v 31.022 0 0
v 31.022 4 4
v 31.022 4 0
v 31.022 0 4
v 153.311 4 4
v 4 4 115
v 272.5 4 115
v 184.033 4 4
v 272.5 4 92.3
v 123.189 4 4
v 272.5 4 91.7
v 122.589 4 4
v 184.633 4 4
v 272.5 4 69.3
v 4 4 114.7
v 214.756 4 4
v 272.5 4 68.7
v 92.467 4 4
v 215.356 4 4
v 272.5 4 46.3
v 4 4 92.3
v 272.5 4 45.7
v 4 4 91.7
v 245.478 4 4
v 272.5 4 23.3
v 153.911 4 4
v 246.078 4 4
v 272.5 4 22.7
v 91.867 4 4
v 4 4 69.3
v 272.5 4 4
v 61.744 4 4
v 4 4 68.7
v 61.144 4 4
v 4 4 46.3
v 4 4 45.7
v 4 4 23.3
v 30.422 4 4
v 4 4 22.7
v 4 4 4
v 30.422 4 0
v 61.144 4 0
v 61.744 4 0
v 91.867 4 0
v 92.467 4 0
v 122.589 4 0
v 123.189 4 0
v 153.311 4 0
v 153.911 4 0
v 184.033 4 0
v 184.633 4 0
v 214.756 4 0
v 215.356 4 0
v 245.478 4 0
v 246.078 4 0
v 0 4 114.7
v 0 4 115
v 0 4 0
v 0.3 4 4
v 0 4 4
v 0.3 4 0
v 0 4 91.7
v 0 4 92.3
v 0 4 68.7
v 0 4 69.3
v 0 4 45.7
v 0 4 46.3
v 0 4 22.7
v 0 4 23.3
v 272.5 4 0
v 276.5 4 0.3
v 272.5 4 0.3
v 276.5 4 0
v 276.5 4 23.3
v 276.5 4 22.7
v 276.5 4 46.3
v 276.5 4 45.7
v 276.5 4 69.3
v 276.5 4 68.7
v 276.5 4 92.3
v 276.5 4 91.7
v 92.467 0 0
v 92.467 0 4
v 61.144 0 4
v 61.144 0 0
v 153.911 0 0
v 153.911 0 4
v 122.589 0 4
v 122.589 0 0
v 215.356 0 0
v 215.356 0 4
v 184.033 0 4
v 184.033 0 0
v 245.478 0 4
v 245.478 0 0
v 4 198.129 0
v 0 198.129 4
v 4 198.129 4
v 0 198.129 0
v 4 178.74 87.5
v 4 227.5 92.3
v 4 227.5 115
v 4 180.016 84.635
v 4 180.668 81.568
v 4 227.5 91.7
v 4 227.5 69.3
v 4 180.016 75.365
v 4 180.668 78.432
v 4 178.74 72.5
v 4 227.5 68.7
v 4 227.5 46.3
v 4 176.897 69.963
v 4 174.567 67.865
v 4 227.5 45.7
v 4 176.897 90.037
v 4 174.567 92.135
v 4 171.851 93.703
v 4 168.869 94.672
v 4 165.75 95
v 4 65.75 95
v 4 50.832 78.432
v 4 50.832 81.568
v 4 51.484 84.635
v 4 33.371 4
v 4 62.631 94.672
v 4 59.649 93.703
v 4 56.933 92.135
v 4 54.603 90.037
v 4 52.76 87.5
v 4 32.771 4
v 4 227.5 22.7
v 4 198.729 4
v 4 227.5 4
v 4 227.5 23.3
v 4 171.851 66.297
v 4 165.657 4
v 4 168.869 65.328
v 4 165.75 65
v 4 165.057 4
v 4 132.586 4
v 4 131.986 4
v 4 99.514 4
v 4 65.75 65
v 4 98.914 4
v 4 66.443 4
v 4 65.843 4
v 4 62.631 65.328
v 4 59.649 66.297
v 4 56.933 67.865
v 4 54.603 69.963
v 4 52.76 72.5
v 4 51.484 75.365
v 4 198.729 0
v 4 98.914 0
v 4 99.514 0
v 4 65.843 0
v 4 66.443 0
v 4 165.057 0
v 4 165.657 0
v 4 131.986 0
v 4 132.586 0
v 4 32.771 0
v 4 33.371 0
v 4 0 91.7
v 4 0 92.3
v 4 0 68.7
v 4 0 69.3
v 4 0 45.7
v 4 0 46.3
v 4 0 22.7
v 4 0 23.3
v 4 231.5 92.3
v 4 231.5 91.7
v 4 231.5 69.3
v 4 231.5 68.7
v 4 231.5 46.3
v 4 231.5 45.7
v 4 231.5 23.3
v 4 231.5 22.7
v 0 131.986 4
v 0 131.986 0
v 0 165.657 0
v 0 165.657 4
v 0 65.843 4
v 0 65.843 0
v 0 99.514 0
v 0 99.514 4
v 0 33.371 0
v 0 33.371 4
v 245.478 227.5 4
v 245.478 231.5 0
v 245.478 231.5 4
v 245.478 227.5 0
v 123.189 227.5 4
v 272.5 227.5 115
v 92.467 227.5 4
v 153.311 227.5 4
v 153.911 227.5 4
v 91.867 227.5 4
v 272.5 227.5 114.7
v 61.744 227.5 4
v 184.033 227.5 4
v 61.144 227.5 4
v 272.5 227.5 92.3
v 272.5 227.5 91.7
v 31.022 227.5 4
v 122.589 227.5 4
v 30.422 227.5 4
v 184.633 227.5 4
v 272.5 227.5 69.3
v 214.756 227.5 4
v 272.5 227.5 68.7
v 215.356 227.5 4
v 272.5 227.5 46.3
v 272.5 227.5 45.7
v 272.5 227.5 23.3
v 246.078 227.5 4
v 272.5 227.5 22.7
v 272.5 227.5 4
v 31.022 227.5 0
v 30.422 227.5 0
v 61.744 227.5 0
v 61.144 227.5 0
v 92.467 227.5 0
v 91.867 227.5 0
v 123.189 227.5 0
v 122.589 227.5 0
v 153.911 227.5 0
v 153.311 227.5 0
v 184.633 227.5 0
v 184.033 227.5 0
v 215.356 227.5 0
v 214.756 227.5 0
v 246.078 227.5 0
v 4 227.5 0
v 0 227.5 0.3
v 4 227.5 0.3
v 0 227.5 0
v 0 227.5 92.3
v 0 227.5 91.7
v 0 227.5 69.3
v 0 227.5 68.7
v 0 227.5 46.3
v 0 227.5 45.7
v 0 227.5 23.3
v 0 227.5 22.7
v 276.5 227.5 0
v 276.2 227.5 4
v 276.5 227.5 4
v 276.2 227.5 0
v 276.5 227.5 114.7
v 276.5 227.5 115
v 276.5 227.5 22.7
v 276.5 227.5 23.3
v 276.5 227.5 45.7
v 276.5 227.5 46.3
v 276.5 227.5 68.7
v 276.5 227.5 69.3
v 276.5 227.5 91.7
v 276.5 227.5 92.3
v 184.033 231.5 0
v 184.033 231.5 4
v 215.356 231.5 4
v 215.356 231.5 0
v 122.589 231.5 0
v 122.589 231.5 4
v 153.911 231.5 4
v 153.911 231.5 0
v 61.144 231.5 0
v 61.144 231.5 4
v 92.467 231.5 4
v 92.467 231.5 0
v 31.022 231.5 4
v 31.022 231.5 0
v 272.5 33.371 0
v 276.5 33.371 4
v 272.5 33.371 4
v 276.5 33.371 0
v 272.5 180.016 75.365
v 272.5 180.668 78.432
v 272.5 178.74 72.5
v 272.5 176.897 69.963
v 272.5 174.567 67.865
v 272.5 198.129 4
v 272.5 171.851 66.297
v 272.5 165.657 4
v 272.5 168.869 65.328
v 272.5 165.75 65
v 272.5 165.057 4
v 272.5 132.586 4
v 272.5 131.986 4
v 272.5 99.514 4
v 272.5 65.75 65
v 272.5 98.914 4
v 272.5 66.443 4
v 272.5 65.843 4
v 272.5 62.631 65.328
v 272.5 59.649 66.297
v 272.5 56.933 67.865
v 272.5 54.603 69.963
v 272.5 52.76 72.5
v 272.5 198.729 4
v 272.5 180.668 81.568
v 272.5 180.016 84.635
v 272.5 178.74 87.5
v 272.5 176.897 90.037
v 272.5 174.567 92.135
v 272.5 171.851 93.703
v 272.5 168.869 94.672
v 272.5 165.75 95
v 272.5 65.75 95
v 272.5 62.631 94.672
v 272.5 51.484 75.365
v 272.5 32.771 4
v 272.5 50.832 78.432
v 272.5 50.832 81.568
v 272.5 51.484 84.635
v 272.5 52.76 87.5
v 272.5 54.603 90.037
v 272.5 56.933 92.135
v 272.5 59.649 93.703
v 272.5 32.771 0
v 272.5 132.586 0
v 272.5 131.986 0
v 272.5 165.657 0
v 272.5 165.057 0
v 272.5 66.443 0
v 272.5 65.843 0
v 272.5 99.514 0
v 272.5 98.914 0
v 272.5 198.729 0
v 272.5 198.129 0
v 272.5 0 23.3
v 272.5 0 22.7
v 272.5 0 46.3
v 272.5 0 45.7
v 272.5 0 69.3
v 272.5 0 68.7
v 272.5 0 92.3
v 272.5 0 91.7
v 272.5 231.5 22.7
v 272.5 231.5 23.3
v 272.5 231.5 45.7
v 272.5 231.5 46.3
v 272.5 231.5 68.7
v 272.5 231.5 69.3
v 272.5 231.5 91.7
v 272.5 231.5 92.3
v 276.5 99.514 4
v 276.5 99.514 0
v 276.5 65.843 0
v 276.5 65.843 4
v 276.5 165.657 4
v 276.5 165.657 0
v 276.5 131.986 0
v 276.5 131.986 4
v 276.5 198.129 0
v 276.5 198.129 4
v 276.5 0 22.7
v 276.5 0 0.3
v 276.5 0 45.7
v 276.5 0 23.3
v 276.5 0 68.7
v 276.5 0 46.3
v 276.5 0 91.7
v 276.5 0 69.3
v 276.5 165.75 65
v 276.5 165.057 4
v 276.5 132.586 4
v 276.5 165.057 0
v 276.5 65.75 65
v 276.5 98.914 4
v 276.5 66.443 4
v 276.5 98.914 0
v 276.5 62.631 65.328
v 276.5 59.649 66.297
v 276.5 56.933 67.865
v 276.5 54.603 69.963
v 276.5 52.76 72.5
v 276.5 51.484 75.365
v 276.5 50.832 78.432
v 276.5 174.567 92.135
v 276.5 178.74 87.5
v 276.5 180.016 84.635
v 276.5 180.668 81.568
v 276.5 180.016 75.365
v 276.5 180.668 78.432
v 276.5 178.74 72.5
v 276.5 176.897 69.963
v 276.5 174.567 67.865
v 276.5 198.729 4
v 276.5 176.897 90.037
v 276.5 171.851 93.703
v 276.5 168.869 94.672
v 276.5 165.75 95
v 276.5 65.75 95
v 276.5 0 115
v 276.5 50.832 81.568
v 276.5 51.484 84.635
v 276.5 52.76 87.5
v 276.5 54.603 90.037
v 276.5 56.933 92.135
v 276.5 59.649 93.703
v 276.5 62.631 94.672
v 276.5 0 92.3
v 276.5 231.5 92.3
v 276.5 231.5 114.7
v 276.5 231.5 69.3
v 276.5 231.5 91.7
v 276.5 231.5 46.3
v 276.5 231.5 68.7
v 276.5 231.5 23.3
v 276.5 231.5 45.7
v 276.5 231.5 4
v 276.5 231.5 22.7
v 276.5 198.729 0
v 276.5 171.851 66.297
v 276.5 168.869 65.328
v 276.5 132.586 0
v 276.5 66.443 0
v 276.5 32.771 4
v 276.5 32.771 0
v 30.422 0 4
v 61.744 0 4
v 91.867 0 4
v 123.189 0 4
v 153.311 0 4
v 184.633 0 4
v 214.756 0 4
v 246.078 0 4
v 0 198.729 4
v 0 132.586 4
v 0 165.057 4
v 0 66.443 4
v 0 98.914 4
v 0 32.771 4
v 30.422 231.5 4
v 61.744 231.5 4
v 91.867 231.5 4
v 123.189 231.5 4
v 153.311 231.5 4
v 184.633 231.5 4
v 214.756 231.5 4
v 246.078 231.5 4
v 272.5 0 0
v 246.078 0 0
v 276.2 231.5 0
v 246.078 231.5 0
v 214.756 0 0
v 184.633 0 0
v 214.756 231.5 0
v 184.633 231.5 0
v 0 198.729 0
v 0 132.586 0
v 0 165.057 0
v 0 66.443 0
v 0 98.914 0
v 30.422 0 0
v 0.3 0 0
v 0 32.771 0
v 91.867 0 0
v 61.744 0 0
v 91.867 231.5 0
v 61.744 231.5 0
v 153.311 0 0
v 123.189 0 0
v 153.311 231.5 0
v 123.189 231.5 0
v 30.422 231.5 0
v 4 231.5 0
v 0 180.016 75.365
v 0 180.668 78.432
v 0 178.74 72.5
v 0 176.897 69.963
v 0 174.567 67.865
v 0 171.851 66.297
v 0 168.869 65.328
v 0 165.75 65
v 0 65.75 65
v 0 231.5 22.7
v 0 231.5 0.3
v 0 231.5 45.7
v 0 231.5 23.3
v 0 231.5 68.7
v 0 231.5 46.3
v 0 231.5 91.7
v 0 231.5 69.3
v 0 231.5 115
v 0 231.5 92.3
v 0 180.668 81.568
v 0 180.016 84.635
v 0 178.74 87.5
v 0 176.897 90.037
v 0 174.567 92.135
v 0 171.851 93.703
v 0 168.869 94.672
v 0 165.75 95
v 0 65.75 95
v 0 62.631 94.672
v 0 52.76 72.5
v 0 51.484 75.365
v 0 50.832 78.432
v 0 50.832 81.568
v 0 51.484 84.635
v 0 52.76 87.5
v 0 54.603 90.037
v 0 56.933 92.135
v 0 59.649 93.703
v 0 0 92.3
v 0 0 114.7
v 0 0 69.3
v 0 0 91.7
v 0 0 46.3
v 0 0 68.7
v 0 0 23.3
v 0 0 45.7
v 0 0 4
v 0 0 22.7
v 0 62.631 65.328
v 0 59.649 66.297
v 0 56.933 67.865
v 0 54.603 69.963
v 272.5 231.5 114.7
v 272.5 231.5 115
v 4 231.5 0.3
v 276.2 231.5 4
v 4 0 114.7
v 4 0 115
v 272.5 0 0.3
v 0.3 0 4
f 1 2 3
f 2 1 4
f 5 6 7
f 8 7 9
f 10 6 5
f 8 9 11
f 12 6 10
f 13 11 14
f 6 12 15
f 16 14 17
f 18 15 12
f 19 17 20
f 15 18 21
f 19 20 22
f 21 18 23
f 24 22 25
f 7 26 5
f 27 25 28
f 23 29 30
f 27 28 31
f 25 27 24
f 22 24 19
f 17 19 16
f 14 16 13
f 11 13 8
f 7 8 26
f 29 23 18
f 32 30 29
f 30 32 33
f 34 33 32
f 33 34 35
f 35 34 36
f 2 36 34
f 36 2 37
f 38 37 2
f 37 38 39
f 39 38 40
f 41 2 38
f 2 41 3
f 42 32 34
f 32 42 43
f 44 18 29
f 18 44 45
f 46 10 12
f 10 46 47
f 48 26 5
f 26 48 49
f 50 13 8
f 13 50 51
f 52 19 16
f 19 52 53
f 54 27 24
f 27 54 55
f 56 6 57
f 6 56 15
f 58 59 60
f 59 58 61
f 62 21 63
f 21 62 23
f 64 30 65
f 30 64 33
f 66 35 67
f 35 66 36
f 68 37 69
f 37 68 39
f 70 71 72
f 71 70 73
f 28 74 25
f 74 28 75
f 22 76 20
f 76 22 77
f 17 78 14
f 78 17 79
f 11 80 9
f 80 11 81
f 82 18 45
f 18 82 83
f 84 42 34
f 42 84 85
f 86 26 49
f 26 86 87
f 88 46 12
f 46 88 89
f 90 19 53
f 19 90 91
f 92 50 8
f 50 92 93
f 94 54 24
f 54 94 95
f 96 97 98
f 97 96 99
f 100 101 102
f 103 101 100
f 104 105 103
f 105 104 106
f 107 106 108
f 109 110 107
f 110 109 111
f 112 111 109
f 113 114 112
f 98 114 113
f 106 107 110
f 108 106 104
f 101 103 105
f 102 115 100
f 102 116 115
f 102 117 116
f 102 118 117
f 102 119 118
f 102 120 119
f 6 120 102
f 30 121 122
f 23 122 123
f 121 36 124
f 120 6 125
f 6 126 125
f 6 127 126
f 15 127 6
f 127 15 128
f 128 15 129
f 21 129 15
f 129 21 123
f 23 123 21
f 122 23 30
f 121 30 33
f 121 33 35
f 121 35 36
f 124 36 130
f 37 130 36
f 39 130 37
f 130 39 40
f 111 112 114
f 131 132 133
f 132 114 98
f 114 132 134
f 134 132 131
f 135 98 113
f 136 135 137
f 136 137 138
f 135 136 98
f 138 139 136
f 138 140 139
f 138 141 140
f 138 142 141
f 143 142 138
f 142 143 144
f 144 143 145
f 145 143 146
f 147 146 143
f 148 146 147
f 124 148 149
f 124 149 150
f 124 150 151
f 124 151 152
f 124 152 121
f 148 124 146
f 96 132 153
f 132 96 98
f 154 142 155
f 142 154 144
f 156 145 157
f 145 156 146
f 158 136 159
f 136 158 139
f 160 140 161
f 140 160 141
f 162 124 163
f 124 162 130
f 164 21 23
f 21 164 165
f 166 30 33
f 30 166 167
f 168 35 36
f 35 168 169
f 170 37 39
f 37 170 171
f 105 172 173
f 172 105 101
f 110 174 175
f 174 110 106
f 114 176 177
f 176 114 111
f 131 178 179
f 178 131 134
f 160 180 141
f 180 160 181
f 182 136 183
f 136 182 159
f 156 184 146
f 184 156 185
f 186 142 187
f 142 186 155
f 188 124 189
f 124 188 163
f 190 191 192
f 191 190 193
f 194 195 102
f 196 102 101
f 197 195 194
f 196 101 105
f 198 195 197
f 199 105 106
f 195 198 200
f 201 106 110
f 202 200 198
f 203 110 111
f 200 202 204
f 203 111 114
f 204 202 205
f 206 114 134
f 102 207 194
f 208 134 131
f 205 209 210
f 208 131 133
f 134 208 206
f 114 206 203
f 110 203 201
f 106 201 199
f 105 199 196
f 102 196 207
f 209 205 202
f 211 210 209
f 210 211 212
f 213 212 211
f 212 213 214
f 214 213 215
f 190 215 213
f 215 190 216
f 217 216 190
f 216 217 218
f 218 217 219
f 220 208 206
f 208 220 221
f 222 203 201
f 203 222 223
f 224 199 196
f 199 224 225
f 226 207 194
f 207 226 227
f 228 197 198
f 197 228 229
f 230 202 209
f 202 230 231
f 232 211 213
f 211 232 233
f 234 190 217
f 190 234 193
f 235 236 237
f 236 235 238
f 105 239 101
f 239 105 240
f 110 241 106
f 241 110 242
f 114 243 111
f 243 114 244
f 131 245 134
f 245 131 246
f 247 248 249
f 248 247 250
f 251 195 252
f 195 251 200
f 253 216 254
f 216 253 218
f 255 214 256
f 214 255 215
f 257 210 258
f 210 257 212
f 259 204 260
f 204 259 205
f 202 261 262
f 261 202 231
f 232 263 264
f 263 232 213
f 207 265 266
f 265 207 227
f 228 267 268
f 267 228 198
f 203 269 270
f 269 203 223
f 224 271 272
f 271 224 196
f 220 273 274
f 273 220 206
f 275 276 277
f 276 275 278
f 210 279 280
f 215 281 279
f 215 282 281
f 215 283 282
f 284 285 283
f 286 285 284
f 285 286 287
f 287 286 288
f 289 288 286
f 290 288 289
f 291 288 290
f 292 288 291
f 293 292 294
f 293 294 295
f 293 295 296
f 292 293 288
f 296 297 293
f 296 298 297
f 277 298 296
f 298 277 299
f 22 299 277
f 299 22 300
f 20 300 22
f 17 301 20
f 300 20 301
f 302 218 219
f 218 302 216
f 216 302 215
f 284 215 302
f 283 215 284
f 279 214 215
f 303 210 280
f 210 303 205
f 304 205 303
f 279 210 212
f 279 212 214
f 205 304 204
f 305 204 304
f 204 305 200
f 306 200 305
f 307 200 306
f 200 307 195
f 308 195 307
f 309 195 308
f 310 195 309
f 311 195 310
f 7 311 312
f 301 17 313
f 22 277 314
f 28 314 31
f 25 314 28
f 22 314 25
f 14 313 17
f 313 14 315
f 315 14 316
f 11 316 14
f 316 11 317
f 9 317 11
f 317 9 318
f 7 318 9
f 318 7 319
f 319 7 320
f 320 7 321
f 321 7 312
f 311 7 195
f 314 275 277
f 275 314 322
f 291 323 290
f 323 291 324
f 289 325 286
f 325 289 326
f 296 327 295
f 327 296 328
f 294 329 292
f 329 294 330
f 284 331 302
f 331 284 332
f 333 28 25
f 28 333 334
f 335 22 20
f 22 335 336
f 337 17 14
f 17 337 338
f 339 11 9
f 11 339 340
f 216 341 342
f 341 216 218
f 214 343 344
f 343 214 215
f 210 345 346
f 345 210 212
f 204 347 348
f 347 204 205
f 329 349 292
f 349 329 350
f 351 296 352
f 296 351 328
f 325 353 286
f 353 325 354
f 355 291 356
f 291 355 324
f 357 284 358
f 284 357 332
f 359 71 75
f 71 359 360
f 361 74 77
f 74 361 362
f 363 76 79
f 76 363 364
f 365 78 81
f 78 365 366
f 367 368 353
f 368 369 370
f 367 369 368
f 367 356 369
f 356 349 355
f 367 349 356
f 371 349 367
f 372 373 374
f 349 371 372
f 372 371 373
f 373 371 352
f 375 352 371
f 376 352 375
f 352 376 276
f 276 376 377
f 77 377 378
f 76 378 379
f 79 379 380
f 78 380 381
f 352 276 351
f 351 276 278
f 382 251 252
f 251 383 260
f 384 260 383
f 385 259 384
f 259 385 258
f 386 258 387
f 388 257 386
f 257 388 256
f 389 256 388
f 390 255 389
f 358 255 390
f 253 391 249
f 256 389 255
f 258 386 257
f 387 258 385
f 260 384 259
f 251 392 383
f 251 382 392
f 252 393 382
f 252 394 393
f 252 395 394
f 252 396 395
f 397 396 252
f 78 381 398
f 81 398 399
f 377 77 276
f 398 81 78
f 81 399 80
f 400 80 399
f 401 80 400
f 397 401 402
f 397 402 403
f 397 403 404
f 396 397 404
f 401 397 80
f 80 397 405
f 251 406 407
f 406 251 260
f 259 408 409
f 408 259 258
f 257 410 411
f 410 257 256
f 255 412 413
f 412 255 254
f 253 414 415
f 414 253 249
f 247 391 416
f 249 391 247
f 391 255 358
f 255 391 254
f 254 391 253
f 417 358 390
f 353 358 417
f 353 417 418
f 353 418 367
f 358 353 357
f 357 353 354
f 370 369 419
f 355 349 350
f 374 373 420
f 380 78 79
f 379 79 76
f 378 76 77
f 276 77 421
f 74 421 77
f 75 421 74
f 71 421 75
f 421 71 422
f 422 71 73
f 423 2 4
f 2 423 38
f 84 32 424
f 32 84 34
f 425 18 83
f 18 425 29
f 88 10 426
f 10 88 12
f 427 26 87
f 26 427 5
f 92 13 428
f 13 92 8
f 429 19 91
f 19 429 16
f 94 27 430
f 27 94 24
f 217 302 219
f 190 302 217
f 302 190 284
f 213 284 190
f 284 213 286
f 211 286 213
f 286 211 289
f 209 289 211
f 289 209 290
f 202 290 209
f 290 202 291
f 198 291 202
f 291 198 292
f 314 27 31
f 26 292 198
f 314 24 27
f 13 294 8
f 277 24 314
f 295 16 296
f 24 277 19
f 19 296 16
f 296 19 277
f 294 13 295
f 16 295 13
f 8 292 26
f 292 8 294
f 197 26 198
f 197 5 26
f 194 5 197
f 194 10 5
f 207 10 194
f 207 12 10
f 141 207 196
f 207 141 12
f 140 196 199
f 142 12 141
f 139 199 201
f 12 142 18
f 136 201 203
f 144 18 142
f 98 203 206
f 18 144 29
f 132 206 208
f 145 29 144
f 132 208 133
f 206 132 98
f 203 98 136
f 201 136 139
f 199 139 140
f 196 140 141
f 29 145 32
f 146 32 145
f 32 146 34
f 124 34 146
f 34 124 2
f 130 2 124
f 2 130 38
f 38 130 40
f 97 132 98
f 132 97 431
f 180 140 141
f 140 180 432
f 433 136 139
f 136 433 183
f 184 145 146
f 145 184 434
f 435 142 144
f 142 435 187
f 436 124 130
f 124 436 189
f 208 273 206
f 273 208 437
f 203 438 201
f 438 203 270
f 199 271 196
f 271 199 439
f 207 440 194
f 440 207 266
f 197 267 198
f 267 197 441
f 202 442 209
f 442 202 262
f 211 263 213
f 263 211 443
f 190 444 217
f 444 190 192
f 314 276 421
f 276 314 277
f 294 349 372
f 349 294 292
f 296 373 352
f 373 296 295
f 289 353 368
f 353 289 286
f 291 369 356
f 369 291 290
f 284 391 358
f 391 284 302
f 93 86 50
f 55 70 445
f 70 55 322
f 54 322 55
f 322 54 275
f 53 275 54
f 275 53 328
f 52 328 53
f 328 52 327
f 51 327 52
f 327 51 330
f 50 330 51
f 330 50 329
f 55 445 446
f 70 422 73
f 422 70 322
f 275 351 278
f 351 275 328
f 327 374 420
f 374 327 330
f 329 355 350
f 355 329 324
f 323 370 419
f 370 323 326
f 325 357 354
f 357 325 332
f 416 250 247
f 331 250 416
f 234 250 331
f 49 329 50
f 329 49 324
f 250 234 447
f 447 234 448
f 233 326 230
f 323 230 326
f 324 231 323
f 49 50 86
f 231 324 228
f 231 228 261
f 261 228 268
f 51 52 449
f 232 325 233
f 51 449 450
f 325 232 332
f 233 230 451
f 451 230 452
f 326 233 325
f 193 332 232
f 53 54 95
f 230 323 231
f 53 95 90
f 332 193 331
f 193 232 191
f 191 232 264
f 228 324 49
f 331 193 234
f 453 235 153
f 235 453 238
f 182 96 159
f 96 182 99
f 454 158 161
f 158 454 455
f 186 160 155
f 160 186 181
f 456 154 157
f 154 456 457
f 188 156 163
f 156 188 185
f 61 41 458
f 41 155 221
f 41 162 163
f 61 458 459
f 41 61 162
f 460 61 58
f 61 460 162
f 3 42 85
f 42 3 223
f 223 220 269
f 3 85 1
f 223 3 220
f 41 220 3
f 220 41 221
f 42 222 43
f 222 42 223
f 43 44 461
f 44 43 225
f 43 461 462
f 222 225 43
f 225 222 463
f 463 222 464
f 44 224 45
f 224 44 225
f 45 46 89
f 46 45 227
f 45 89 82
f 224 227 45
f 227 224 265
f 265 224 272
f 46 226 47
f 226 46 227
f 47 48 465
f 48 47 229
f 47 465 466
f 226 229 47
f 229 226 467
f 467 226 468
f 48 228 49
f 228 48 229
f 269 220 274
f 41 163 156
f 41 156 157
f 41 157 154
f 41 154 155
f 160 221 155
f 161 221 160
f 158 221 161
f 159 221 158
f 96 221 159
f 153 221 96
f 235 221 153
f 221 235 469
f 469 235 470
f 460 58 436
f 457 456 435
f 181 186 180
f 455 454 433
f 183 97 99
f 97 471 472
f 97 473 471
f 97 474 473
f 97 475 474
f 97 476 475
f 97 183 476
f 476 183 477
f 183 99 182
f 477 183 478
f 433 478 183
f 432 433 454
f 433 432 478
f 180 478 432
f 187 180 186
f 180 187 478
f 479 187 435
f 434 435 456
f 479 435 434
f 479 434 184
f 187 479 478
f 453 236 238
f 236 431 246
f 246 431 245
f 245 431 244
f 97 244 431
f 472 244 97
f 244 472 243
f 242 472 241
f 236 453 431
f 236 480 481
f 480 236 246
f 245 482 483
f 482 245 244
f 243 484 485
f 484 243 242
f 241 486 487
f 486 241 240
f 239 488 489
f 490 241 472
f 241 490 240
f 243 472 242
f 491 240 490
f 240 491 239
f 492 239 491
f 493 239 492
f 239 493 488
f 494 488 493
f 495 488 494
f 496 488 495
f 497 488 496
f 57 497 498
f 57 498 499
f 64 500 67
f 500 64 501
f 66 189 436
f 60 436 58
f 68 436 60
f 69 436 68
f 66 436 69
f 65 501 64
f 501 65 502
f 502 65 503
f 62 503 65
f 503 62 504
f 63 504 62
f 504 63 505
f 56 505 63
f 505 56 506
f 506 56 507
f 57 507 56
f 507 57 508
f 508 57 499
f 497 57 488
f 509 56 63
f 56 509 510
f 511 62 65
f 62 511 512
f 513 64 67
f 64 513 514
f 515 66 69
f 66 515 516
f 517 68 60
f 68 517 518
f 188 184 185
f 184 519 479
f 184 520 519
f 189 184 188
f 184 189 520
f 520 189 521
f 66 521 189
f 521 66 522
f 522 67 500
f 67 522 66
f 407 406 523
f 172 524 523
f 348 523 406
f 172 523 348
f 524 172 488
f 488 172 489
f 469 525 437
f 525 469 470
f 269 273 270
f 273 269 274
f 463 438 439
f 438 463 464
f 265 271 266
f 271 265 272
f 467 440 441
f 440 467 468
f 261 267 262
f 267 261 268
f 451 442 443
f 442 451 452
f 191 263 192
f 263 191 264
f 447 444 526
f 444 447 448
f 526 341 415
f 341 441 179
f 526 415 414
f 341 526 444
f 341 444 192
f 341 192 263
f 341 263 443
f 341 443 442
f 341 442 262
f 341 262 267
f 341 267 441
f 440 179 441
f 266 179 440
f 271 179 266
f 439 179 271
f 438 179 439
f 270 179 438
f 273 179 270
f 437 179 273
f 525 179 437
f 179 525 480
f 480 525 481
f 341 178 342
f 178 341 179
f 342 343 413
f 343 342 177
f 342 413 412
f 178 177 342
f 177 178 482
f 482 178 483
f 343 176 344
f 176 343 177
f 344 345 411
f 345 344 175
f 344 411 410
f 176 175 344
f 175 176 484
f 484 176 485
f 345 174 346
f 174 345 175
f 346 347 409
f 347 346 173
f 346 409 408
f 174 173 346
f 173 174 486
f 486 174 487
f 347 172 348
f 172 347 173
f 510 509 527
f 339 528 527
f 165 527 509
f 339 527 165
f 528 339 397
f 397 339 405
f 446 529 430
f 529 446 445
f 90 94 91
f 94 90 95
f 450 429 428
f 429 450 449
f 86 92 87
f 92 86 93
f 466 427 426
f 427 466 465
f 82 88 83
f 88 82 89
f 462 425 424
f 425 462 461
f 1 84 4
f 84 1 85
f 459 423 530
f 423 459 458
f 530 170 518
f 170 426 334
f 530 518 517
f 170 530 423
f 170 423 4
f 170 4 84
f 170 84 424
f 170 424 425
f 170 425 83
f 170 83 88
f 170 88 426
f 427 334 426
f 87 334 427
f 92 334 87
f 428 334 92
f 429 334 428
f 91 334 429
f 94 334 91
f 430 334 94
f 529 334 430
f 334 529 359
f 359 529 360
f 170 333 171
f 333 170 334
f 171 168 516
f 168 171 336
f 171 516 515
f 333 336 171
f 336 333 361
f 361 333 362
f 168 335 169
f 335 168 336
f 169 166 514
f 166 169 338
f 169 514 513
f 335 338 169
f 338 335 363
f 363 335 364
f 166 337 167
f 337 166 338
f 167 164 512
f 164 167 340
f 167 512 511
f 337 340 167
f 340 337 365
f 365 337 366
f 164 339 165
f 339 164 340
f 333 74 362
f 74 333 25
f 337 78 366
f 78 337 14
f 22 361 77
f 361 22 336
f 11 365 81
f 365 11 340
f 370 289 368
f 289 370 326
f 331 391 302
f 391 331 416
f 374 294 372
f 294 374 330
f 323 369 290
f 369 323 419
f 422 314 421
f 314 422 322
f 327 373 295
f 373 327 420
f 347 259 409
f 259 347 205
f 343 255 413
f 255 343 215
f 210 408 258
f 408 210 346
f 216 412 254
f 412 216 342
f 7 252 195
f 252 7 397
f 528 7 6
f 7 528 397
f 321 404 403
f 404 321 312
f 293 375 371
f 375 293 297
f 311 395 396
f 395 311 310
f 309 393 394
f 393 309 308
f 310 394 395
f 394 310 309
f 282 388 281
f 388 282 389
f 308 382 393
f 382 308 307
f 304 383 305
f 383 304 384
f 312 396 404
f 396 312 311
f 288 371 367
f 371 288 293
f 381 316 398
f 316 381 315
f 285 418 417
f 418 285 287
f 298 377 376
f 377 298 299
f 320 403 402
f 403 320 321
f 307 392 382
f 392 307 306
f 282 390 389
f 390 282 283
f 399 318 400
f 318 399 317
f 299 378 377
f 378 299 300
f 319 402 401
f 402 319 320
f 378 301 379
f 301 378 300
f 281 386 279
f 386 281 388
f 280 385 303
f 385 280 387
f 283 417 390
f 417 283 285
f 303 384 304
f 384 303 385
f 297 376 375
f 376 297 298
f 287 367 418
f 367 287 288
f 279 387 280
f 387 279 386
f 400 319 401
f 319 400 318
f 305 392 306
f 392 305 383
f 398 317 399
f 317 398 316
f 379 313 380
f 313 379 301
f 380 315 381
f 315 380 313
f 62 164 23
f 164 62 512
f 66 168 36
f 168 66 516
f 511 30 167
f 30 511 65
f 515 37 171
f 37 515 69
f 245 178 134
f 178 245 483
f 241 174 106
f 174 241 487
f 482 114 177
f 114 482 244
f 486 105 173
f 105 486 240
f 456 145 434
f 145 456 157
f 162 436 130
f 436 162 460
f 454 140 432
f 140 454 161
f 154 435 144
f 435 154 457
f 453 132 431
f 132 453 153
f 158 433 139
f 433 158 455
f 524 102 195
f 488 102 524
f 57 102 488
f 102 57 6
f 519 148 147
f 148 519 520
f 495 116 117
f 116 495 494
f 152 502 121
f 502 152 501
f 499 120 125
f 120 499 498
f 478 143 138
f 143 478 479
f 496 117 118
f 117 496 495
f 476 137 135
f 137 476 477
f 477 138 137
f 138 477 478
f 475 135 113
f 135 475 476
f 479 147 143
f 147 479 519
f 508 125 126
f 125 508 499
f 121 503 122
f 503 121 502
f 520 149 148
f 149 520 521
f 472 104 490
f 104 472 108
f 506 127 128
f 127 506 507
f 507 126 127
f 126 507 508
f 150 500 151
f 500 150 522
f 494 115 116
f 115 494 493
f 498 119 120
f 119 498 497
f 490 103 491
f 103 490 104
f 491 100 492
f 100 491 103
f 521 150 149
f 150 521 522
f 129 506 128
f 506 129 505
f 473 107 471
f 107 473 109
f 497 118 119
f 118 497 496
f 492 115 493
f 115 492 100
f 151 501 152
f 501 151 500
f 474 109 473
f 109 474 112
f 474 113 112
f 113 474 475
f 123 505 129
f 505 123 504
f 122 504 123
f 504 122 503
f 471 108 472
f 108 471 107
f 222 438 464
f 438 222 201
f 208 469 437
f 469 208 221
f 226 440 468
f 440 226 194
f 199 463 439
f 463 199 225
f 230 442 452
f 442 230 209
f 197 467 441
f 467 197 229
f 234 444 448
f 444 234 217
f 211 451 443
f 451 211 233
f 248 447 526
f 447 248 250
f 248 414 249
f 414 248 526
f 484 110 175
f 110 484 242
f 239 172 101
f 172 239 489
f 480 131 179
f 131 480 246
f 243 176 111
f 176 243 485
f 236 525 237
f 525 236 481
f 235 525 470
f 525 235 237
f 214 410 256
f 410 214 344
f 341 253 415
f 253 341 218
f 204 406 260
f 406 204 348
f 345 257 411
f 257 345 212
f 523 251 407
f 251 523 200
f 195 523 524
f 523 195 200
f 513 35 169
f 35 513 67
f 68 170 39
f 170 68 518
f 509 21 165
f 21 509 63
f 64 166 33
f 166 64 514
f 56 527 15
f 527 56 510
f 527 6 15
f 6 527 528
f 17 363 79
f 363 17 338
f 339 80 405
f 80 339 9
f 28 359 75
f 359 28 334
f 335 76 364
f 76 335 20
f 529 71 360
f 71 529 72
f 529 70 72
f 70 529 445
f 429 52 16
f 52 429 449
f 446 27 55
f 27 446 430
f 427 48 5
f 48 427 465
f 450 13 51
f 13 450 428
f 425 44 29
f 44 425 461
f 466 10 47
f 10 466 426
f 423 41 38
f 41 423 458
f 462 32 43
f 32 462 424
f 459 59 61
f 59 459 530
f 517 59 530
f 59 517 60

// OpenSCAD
// options: assembled, unfolded, optimized
mode = "assembled"; 
//mode = "unfolded"; 
//mode = "optimized"; 

// thickness of the material
thickness = 4;

innerMargin = 5;

// outter dimensions of the box
width = (558 - innerMargin)/2;
length = (468 - innerMargin)/2;
height = 230/2;

// number of teeth along width, lengh, height
teethW = 9;
teethL = 7;
teethH = 5;

// hole for holding
handleR = 15;
handleL = 100;
handleThickness = 20;

// positive value narrows the teeth, negative - widens them
tolerance = 0.3;

box();

module box()
{
	angle = mode=="assembled"?90:0;

	if(mode!="optimized")
	{
		bottom();
		right(angle);
		left(angle);
		rear(angle);
		front(angle);
	}
	else
	{
		translate([height, 0, 0])
		{
			bottom();
			right(angle);
			left(angle);
		}

		translate([width/2 + width + 1, -height/2 - 1, 0])
		rotate([0, 0, 180])
		translate([-width/2, -height/2 - length, 0])
		rear(angle);
		
		translate([0, -1, 0])
		front(angle);
	}
}

module bottom()
{
	wall(width, length, thickness, [teethW, teethL, teethW, teethL], [0, 0, 0, 0]);
}

module right(angle)
{
	translate([width, 0, 0])
	rotate([0, -1*angle, 0])
	difference()
	{
		wall(height, length, thickness, [teethH, teethL, teethH, 0], [0, 1, 0, 0]);
		hull()
		{
			for(i = [-1:2:1])
			translate([height - handleThickness - handleR, length/2 + handleL/2*i, -1])
			cylinder(r = handleR, h = thickness + 2);
		}
	}
}

module left(angle)
{
	rotate([0, angle, 0])
	translate([-height, 0, 0])
	difference()
	{
		wall(height, length, thickness, [teethH, 0, teethH, teethL], [0, 1, 0, 1]);
		hull()
		{
			for(i = [-1:2:1])
			translate([handleThickness + handleR, length/2 + handleL/2*i, -1])
			cylinder(r = handleR, h = thickness + 2);
		}
	}
}

module front(angle)
{
	rotate([-1*angle, 0, 0])
	translate([0, -height, 0])
	wall(width, height, thickness, [0, teethH, teethW, teethH], [0, 1, 1, 1]);
}

module rear(angle)
{
	translate([0, length, 0])
	rotate([angle, 0, 0])
	wall(width, height, thickness, [teethW, teethH, 0, teethH], [1, 1, 0, 1]);
}

// teethConf - 4 values showing number of teeth, 0 - teeth are not cut
// teethOddity - 4 values, 0 for even teeth, 1 - for odd
module wall(x, y, thickness, teethConf, teethOddity)
{
	difference()
	{
		cube([x, y, thickness]);

		if(teethConf[0] > 0)
			cutter(x, teethConf[0], thickness, teethOddity[0]==0);

		if(teethConf[1] > 0)
			translate([0, y, 0])
			rotate([0, 0, -90])
			cutter(y, teethConf[1], thickness, teethOddity[1]==0);

		if(teethConf[2] > 0)
			translate([x, y, 0])
			rotate([0, 0, -180])
			cutter(x, teethConf[2], thickness, teethOddity[2]==0);

		if(teethConf[3] > 0)
			translate([x, 0, 0])
			rotate([0, 0, -270])
			cutter(y, teethConf[3], thickness, teethOddity[3]==0);
	}
}

// tool for cutting teeth
module cutter(length, count, thickness, odd = true)
{
	for(i = [0:count])
	{
		if(odd && i%2 == 0)
			translate([i*length/count - tolerance, -1, -1])
			cube([length/count + tolerance*2, thickness+1, thickness+2]);
		if(!odd && i%2 != 0)
			translate([i*length/count - tolerance, -1, -1])
			cube([length/count + tolerance*2, thickness+1, thickness+2]);
	}
}
